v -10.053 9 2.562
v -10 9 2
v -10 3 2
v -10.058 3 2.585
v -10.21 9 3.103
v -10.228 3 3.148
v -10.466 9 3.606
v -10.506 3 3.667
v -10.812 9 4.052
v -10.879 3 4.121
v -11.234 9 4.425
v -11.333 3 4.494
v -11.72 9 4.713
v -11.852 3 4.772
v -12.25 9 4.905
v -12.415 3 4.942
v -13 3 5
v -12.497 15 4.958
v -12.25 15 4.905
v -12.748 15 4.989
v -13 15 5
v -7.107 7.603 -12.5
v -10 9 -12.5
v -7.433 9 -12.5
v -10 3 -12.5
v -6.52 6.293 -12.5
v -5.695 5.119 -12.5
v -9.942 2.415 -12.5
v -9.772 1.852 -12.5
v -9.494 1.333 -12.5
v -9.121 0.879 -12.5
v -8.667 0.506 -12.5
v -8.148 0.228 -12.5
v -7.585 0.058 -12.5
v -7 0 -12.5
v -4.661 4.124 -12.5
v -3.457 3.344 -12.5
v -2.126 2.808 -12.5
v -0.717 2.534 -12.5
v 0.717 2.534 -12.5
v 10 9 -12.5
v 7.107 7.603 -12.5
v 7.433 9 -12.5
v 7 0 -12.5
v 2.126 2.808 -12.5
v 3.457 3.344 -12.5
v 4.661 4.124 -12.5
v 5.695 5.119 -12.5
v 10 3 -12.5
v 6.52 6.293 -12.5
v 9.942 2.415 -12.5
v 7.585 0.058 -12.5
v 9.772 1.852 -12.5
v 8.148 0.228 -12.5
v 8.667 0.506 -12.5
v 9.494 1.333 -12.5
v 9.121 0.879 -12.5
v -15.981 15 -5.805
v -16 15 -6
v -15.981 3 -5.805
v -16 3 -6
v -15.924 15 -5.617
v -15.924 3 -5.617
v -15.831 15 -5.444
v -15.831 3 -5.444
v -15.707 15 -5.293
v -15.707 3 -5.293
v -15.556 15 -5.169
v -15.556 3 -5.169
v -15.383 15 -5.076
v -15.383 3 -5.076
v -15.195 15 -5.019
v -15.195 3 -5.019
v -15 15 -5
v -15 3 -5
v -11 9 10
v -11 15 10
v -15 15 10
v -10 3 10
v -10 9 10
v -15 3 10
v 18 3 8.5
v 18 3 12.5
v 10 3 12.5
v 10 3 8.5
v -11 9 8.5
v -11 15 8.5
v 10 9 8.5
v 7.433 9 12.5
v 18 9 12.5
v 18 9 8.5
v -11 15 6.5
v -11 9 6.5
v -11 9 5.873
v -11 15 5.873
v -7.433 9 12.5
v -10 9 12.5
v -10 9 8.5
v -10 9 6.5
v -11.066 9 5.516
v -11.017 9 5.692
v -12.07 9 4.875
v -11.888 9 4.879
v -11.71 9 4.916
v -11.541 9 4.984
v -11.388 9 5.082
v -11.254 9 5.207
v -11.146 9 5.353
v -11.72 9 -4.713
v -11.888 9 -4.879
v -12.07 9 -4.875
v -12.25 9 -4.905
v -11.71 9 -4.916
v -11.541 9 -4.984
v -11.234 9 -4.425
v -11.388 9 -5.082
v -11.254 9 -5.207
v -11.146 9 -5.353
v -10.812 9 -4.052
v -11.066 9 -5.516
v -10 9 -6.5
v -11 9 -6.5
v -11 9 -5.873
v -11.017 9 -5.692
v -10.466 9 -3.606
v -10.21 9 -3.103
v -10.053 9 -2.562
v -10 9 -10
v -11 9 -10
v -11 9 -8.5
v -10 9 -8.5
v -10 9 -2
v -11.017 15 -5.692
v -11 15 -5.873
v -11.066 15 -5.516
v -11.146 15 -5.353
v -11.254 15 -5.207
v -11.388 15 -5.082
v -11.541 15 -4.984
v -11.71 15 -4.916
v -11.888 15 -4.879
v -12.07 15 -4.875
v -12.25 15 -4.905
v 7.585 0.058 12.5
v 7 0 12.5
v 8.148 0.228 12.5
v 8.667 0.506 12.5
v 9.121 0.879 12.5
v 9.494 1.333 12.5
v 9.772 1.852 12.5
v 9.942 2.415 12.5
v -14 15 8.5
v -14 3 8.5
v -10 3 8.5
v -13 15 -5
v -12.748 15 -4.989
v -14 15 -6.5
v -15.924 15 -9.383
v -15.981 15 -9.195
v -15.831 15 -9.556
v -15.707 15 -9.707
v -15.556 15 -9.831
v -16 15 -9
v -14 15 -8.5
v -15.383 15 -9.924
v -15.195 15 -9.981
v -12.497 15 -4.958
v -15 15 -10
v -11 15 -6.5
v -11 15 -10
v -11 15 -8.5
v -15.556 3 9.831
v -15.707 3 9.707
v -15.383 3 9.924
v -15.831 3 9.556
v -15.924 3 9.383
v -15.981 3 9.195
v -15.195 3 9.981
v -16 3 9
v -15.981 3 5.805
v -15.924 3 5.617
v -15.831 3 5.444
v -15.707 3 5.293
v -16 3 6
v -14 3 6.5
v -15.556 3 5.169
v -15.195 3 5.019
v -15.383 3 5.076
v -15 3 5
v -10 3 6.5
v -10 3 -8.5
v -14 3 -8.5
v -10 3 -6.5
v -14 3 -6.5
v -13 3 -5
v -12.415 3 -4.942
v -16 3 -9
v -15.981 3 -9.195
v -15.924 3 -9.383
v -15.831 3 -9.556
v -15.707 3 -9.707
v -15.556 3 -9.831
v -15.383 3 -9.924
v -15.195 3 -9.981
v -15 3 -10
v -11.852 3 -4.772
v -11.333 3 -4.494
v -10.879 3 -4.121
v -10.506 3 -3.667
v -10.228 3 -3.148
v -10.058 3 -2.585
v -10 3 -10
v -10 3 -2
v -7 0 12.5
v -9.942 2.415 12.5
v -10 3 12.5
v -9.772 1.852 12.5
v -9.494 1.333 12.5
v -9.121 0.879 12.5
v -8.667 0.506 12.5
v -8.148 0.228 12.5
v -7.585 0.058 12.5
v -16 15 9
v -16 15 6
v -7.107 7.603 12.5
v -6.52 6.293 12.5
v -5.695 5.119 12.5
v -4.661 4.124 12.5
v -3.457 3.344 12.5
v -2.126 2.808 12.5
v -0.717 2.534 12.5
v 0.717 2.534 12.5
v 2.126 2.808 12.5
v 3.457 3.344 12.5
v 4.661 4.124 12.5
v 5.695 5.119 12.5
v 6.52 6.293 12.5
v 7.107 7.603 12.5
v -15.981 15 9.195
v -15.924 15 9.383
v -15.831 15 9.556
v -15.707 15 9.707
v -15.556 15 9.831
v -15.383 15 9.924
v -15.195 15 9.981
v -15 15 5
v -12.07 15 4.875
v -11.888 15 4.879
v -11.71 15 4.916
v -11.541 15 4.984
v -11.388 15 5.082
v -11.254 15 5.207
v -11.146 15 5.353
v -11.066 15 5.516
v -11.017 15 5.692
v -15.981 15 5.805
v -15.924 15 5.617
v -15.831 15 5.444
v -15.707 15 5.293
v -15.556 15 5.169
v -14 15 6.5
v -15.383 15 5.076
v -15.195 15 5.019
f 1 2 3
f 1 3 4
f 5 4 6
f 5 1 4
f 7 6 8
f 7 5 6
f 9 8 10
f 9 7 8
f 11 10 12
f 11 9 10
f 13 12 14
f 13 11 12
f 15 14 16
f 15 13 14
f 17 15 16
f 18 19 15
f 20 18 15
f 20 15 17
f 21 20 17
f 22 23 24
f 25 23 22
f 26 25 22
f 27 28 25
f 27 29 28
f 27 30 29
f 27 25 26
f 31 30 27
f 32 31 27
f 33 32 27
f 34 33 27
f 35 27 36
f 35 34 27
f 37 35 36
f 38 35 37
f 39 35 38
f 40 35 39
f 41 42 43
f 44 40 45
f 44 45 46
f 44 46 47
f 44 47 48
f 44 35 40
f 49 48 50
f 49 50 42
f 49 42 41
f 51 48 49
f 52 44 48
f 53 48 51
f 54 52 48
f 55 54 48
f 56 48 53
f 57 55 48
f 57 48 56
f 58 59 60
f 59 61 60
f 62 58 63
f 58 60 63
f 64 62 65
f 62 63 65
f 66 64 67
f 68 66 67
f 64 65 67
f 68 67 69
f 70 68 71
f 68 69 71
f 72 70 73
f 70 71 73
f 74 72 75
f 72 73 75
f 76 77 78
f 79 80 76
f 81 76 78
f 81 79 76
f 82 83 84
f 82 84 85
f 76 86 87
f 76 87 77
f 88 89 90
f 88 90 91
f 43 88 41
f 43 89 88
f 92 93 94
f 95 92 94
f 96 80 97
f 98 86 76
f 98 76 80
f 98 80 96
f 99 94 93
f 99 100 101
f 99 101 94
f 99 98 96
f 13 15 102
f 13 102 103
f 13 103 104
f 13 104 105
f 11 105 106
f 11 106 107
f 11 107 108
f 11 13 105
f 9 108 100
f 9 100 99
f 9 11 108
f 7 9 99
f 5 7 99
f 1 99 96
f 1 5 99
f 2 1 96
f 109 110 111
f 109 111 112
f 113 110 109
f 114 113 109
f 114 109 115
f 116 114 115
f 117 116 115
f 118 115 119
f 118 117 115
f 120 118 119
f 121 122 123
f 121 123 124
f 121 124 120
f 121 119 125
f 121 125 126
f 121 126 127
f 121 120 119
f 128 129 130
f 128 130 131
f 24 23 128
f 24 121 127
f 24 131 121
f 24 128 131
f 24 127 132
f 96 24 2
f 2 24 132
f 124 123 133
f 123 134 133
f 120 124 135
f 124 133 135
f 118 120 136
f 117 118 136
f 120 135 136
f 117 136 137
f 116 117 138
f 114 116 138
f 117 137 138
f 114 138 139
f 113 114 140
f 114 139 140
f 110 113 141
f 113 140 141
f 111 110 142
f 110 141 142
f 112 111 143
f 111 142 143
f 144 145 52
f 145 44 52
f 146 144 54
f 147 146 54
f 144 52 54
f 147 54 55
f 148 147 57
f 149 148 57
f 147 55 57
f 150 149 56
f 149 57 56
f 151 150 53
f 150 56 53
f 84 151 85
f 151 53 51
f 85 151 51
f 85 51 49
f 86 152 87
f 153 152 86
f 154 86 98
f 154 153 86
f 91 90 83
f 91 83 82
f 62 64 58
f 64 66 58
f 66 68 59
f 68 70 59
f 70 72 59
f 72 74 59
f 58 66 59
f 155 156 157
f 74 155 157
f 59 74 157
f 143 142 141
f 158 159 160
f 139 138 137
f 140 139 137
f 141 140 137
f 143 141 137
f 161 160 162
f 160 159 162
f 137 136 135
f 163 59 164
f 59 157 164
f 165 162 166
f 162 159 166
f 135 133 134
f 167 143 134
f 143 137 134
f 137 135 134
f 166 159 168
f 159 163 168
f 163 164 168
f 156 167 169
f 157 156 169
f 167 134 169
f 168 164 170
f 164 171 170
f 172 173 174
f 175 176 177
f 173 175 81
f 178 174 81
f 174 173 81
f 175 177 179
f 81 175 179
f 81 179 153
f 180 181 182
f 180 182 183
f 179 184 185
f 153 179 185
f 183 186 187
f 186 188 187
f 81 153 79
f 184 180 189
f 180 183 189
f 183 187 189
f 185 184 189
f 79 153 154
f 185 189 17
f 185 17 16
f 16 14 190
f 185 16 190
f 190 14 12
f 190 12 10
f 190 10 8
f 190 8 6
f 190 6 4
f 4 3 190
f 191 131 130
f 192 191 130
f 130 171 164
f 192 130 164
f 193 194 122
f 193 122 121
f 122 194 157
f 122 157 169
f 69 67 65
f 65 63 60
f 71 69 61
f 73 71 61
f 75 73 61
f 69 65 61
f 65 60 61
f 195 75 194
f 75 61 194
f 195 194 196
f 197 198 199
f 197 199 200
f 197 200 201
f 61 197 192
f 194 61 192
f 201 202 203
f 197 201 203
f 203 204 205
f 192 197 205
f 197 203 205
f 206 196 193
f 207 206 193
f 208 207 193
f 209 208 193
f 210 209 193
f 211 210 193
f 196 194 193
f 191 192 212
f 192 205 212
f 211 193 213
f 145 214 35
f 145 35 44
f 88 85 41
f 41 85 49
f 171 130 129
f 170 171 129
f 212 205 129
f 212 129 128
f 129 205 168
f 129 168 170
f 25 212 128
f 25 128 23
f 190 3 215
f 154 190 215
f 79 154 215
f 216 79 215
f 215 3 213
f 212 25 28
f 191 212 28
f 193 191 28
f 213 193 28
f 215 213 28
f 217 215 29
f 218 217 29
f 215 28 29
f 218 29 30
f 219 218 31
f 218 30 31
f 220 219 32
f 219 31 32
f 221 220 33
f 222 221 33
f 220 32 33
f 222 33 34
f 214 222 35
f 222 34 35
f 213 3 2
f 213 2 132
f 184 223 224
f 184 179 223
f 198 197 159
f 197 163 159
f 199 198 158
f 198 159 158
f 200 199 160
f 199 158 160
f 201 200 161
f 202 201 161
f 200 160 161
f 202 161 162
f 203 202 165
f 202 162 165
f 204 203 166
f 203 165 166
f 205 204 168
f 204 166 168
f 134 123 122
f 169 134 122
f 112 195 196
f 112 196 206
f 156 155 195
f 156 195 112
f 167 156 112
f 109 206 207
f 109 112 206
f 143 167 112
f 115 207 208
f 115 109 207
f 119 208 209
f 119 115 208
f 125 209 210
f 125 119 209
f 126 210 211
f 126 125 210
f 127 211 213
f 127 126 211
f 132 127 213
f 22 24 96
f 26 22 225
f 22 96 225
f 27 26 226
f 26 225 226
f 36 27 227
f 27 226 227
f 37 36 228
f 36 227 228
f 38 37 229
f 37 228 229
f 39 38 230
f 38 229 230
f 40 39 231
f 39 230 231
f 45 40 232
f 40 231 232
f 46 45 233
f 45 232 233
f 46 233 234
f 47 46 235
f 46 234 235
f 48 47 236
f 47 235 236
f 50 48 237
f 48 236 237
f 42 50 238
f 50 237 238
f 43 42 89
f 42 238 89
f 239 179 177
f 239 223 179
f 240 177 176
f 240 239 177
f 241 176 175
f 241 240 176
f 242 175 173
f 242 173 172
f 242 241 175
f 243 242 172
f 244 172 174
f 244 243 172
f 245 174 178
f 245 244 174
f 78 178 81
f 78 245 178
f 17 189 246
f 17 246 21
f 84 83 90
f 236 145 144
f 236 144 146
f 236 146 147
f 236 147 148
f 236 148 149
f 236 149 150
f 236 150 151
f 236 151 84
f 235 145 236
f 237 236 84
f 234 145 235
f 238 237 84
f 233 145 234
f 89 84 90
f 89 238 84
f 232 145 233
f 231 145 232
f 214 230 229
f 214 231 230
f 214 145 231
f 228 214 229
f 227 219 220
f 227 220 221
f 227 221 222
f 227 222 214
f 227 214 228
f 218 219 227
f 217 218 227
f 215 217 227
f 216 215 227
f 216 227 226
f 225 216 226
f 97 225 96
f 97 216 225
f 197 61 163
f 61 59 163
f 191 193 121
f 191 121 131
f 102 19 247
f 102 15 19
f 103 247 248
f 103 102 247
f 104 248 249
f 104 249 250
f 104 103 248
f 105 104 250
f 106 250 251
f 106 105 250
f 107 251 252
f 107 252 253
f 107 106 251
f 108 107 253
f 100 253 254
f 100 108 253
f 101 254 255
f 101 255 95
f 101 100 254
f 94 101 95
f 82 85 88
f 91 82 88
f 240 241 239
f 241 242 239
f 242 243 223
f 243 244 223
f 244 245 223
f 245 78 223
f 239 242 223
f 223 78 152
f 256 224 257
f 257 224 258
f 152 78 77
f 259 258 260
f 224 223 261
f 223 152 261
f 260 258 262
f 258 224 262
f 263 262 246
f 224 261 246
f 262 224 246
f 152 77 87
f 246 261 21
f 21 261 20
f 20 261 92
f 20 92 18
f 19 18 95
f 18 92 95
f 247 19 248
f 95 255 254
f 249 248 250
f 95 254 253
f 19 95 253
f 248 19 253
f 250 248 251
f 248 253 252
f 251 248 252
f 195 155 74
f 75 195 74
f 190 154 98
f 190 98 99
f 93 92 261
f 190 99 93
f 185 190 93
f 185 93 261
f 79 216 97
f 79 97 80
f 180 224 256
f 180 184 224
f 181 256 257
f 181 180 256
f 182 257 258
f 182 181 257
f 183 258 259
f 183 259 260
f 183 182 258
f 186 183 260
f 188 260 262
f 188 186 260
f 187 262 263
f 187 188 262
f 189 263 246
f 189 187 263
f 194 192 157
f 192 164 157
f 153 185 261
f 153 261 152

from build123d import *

# Parameters (mm, degrees)
ESBO_O1_W                = 20
ESBO_O1_H                = 25
RESSALTO_EXTRUS_O1_DEPTH = 9
ESBO_O2_R                = 7.5
CORTE_EXTRUS_O1_DEPTH    = 29.390139133
FILETE1_R                = 3
RESSALTO_EXTRUS_O2_DEPTH = 6
RESSALTO_EXTRUS_O3_DEPTH = 6
FILETE3_R                = 1
FILETE5_R                = 3
FILETE6_R                = 1
ESBO_O5_W                = 4
ESBO_O5_H                = 6
RESSALTO_EXTRUS_O4_DEPTH = 8


with BuildPart() as part:
    # Esboço1 → Ressalto-extrusão1 (new body)
    with BuildSketch(Plane(origin=(0, 0, 0), x_dir=(1, 0, 0), z_dir=(0, 1, 0))):
        Rectangle(ESBO_O1_W, ESBO_O1_H)
    extrude(amount=RESSALTO_EXTRUS_O1_DEPTH)

    # Esboço2 → Corte-extrusão1 (cut, through all)
    with BuildSketch(Plane.XY.offset(12.5)):
        with Locations((0, 10)):
            Circle(ESBO_O2_R)
    extrude(amount=-CORTE_EXTRUS_O1_DEPTH, mode=Mode.SUBTRACT)

    # Filete1
    filete1_edges = [part.edges().sort_by_distance(p)[0] for p in [
        (-10, 0, 0),
        (10, 0, 0),
    ]]
    fillet(filete1_edges, radius=FILETE1_R)

    # Esboço3 → Ressalto-extrusão2 (add)
    with BuildSketch(Plane(origin=(0, 9, 0), x_dir=(1, 0, 0), z_dir=(0, 1, 0))):
        Polygon((-16, 10), (-10, 10), (-10, 8.5), (-14, 8.5), (-14, 6.5), (-10, 6.5), (-10, 5), (-16, 5), align=None)
        Polygon((-14, -6.5), (-10, -6.5), (-10, -5), (-16, -5), (-16, -10), (-10, -10), (-10, -8.5), (-14, -8.5), align=None)
    extrude(amount=-RESSALTO_EXTRUS_O2_DEPTH)

    # Esboço4 → Ressalto-extrusão3 (add)
    with BuildSketch(Plane(origin=(0, 9, 0), x_dir=(1, 0, 0), z_dir=(0, 1, 0))):
        Polygon((-16, -10), (-16, -5), (-11, -5), (-11, -6.5), (-14, -6.5), (-14, -8.5), (-11, -8.5), (-11, -10), align=None)
        Polygon((-11, 10), (-16, 10), (-16, 5), (-11, 5), (-11, 6.5), (-14, 6.5), (-14, 8.5), (-11, 8.5), align=None)
    extrude(amount=RESSALTO_EXTRUS_O3_DEPTH)

    # Filete3
    filete3_edges = [part.edges().sort_by_distance(p)[0] for p in [
        (-16, 9, -5),
        (-16, 9, -10),
        (-16, 9, 10),
        (-16, 9, 5),
    ]]
    fillet(filete3_edges, radius=FILETE3_R)

    # Filete5
    # the kernel refuses this fillet: 3 mm, written as the material it adds along each edge
    with BuildSketch(Plane(origin=(-10, 16.5, -5), x_dir=(-1, 0, 0), z_dir=(0, -1, 0))) as filete5_piece_1_section:
        with BuildLine():
            CenterArc((FILETE5_R, -FILETE5_R), FILETE5_R, 90, 90)
            Line((0, -FILETE5_R), (0, 0))
            Line((0, 0), (FILETE5_R, 0))
        make_face()
    filete5_piece_1 = extrude(amount=13.5, mode=Mode.PRIVATE)
    filete5_piece_1 = split(filete5_piece_1, bisect_by=Plane(origin=(-11.589070595, 9, -4.827479681), z_dir=(0, 1, 0)), keep=Keep.TOP, mode=Mode.PRIVATE)
    filete5_piece_1 = split(filete5_piece_1, bisect_by=Plane(origin=(-11, 12, -4.827479681), z_dir=(-1, 0, 0)), keep=Keep.TOP, mode=Mode.PRIVATE)
    filete5_piece_1 = split(filete5_piece_1, bisect_by=Plane(origin=(-11.589070595, 15, -4.827479681), z_dir=(0, -1, 0)), keep=Keep.TOP, mode=Mode.PRIVATE)
    add(filete5_piece_1)
    with BuildSketch(Plane(origin=(-10, 9, -5), x_dir=(-1, 0, 0), z_dir=(0, -1, 0))) as filete5_piece_2_section:
        with BuildLine():
            CenterArc((FILETE5_R, -FILETE5_R), FILETE5_R, 90, 90)
            Line((0, -FILETE5_R), (0, 0))
            Line((0, 0), (FILETE5_R, 0))
        make_face()
    filete5_piece_2 = extrude(amount=6, mode=Mode.PRIVATE)
    filete5_piece_2 = split(filete5_piece_2, bisect_by=Plane(origin=(-11, 6, -4.827479681), z_dir=(-1, 0, 0)), keep=Keep.TOP, mode=Mode.PRIVATE)
    add(filete5_piece_2)
    with BuildSketch(Plane(origin=(-10, 9, -5), x_dir=(-1, 0, 0), z_dir=(0, -1, 0))) as filete5_piece_3_section:
        with BuildLine():
            CenterArc((FILETE5_R, -FILETE5_R), FILETE5_R, 90, 90)
            Line((0, -FILETE5_R), (0, 0))
            Line((0, 0), (FILETE5_R, 0))
        make_face()
    filete5_piece_3 = extrude(amount=6, mode=Mode.PRIVATE)
    filete5_piece_3 = split(filete5_piece_3, bisect_by=Plane(origin=(-11, 6, -4.141402177), z_dir=(1, 0, 0)), keep=Keep.TOP, mode=Mode.PRIVATE)
    add(filete5_piece_3)
    with BuildSketch(Plane(origin=(-10, 16.5, 5), x_dir=(-1, 0, 0), z_dir=(0, -1, 0))) as filete5_piece_4_section:
        with BuildLine():
            CenterArc((FILETE5_R, FILETE5_R), FILETE5_R, 180, 90)
            Line((0, FILETE5_R), (0, 0))
            Line((0, 0), (FILETE5_R, 0))
        make_face()
    filete5_piece_4 = extrude(amount=13.5, mode=Mode.PRIVATE)
    filete5_piece_4 = split(filete5_piece_4, bisect_by=Plane(origin=(-11.589070595, 15, 4.827479681), z_dir=(0, -1, 0)), keep=Keep.TOP, mode=Mode.PRIVATE)
    filete5_piece_4 = split(filete5_piece_4, bisect_by=Plane(origin=(-11.589070595, 9, 4.827479681), z_dir=(0, 1, 0)), keep=Keep.TOP, mode=Mode.PRIVATE)
    filete5_piece_4 = split(filete5_piece_4, bisect_by=Plane(origin=(-11, 12, 4.827479681), z_dir=(-1, 0, 0)), keep=Keep.TOP, mode=Mode.PRIVATE)
    add(filete5_piece_4)
    with BuildSketch(Plane(origin=(-10, 9, 5), x_dir=(-1, 0, 0), z_dir=(0, -1, 0))) as filete5_piece_5_section:
        with BuildLine():
            CenterArc((FILETE5_R, FILETE5_R), FILETE5_R, 180, 90)
            Line((0, FILETE5_R), (0, 0))
            Line((0, 0), (FILETE5_R, 0))
        make_face()
    filete5_piece_5 = extrude(amount=6, mode=Mode.PRIVATE)
    filete5_piece_5 = split(filete5_piece_5, bisect_by=Plane(origin=(-11, 6, 4.827479681), z_dir=(-1, 0, 0)), keep=Keep.TOP, mode=Mode.PRIVATE)
    add(filete5_piece_5)
    with BuildSketch(Plane(origin=(-10, 9, 5), x_dir=(-1, 0, 0), z_dir=(0, -1, 0))) as filete5_piece_6_section:
        with BuildLine():
            CenterArc((FILETE5_R, FILETE5_R), FILETE5_R, 180, 90)
            Line((0, FILETE5_R), (0, 0))
            Line((0, 0), (FILETE5_R, 0))
        make_face()
    filete5_piece_6 = extrude(amount=6, mode=Mode.PRIVATE)
    filete5_piece_6 = split(filete5_piece_6, bisect_by=Plane(origin=(-11, 6, 4.141402177), z_dir=(1, 0, 0)), keep=Keep.TOP, mode=Mode.PRIVATE)
    add(filete5_piece_6)

    # Filete6
    filete6_edges = [part.edges().sort_by_distance(p)[0] for p in [
        (-11, 12, -4.236067977),
        (-11, 12, 4.236067977),
    ]]
    fillet(filete6_edges, radius=FILETE6_R)

    # Esboço5 → Ressalto-extrusão4 (add)
    with BuildSketch(Plane(origin=(10, 0, 0), x_dir=(0, 0, -1), z_dir=(1, 0, 0))):
        with Locations((-10.5, 6)):
            Rectangle(ESBO_O5_W, ESBO_O5_H)
    extrude(amount=RESSALTO_EXTRUS_O4_DEPTH)


solid = part.part
